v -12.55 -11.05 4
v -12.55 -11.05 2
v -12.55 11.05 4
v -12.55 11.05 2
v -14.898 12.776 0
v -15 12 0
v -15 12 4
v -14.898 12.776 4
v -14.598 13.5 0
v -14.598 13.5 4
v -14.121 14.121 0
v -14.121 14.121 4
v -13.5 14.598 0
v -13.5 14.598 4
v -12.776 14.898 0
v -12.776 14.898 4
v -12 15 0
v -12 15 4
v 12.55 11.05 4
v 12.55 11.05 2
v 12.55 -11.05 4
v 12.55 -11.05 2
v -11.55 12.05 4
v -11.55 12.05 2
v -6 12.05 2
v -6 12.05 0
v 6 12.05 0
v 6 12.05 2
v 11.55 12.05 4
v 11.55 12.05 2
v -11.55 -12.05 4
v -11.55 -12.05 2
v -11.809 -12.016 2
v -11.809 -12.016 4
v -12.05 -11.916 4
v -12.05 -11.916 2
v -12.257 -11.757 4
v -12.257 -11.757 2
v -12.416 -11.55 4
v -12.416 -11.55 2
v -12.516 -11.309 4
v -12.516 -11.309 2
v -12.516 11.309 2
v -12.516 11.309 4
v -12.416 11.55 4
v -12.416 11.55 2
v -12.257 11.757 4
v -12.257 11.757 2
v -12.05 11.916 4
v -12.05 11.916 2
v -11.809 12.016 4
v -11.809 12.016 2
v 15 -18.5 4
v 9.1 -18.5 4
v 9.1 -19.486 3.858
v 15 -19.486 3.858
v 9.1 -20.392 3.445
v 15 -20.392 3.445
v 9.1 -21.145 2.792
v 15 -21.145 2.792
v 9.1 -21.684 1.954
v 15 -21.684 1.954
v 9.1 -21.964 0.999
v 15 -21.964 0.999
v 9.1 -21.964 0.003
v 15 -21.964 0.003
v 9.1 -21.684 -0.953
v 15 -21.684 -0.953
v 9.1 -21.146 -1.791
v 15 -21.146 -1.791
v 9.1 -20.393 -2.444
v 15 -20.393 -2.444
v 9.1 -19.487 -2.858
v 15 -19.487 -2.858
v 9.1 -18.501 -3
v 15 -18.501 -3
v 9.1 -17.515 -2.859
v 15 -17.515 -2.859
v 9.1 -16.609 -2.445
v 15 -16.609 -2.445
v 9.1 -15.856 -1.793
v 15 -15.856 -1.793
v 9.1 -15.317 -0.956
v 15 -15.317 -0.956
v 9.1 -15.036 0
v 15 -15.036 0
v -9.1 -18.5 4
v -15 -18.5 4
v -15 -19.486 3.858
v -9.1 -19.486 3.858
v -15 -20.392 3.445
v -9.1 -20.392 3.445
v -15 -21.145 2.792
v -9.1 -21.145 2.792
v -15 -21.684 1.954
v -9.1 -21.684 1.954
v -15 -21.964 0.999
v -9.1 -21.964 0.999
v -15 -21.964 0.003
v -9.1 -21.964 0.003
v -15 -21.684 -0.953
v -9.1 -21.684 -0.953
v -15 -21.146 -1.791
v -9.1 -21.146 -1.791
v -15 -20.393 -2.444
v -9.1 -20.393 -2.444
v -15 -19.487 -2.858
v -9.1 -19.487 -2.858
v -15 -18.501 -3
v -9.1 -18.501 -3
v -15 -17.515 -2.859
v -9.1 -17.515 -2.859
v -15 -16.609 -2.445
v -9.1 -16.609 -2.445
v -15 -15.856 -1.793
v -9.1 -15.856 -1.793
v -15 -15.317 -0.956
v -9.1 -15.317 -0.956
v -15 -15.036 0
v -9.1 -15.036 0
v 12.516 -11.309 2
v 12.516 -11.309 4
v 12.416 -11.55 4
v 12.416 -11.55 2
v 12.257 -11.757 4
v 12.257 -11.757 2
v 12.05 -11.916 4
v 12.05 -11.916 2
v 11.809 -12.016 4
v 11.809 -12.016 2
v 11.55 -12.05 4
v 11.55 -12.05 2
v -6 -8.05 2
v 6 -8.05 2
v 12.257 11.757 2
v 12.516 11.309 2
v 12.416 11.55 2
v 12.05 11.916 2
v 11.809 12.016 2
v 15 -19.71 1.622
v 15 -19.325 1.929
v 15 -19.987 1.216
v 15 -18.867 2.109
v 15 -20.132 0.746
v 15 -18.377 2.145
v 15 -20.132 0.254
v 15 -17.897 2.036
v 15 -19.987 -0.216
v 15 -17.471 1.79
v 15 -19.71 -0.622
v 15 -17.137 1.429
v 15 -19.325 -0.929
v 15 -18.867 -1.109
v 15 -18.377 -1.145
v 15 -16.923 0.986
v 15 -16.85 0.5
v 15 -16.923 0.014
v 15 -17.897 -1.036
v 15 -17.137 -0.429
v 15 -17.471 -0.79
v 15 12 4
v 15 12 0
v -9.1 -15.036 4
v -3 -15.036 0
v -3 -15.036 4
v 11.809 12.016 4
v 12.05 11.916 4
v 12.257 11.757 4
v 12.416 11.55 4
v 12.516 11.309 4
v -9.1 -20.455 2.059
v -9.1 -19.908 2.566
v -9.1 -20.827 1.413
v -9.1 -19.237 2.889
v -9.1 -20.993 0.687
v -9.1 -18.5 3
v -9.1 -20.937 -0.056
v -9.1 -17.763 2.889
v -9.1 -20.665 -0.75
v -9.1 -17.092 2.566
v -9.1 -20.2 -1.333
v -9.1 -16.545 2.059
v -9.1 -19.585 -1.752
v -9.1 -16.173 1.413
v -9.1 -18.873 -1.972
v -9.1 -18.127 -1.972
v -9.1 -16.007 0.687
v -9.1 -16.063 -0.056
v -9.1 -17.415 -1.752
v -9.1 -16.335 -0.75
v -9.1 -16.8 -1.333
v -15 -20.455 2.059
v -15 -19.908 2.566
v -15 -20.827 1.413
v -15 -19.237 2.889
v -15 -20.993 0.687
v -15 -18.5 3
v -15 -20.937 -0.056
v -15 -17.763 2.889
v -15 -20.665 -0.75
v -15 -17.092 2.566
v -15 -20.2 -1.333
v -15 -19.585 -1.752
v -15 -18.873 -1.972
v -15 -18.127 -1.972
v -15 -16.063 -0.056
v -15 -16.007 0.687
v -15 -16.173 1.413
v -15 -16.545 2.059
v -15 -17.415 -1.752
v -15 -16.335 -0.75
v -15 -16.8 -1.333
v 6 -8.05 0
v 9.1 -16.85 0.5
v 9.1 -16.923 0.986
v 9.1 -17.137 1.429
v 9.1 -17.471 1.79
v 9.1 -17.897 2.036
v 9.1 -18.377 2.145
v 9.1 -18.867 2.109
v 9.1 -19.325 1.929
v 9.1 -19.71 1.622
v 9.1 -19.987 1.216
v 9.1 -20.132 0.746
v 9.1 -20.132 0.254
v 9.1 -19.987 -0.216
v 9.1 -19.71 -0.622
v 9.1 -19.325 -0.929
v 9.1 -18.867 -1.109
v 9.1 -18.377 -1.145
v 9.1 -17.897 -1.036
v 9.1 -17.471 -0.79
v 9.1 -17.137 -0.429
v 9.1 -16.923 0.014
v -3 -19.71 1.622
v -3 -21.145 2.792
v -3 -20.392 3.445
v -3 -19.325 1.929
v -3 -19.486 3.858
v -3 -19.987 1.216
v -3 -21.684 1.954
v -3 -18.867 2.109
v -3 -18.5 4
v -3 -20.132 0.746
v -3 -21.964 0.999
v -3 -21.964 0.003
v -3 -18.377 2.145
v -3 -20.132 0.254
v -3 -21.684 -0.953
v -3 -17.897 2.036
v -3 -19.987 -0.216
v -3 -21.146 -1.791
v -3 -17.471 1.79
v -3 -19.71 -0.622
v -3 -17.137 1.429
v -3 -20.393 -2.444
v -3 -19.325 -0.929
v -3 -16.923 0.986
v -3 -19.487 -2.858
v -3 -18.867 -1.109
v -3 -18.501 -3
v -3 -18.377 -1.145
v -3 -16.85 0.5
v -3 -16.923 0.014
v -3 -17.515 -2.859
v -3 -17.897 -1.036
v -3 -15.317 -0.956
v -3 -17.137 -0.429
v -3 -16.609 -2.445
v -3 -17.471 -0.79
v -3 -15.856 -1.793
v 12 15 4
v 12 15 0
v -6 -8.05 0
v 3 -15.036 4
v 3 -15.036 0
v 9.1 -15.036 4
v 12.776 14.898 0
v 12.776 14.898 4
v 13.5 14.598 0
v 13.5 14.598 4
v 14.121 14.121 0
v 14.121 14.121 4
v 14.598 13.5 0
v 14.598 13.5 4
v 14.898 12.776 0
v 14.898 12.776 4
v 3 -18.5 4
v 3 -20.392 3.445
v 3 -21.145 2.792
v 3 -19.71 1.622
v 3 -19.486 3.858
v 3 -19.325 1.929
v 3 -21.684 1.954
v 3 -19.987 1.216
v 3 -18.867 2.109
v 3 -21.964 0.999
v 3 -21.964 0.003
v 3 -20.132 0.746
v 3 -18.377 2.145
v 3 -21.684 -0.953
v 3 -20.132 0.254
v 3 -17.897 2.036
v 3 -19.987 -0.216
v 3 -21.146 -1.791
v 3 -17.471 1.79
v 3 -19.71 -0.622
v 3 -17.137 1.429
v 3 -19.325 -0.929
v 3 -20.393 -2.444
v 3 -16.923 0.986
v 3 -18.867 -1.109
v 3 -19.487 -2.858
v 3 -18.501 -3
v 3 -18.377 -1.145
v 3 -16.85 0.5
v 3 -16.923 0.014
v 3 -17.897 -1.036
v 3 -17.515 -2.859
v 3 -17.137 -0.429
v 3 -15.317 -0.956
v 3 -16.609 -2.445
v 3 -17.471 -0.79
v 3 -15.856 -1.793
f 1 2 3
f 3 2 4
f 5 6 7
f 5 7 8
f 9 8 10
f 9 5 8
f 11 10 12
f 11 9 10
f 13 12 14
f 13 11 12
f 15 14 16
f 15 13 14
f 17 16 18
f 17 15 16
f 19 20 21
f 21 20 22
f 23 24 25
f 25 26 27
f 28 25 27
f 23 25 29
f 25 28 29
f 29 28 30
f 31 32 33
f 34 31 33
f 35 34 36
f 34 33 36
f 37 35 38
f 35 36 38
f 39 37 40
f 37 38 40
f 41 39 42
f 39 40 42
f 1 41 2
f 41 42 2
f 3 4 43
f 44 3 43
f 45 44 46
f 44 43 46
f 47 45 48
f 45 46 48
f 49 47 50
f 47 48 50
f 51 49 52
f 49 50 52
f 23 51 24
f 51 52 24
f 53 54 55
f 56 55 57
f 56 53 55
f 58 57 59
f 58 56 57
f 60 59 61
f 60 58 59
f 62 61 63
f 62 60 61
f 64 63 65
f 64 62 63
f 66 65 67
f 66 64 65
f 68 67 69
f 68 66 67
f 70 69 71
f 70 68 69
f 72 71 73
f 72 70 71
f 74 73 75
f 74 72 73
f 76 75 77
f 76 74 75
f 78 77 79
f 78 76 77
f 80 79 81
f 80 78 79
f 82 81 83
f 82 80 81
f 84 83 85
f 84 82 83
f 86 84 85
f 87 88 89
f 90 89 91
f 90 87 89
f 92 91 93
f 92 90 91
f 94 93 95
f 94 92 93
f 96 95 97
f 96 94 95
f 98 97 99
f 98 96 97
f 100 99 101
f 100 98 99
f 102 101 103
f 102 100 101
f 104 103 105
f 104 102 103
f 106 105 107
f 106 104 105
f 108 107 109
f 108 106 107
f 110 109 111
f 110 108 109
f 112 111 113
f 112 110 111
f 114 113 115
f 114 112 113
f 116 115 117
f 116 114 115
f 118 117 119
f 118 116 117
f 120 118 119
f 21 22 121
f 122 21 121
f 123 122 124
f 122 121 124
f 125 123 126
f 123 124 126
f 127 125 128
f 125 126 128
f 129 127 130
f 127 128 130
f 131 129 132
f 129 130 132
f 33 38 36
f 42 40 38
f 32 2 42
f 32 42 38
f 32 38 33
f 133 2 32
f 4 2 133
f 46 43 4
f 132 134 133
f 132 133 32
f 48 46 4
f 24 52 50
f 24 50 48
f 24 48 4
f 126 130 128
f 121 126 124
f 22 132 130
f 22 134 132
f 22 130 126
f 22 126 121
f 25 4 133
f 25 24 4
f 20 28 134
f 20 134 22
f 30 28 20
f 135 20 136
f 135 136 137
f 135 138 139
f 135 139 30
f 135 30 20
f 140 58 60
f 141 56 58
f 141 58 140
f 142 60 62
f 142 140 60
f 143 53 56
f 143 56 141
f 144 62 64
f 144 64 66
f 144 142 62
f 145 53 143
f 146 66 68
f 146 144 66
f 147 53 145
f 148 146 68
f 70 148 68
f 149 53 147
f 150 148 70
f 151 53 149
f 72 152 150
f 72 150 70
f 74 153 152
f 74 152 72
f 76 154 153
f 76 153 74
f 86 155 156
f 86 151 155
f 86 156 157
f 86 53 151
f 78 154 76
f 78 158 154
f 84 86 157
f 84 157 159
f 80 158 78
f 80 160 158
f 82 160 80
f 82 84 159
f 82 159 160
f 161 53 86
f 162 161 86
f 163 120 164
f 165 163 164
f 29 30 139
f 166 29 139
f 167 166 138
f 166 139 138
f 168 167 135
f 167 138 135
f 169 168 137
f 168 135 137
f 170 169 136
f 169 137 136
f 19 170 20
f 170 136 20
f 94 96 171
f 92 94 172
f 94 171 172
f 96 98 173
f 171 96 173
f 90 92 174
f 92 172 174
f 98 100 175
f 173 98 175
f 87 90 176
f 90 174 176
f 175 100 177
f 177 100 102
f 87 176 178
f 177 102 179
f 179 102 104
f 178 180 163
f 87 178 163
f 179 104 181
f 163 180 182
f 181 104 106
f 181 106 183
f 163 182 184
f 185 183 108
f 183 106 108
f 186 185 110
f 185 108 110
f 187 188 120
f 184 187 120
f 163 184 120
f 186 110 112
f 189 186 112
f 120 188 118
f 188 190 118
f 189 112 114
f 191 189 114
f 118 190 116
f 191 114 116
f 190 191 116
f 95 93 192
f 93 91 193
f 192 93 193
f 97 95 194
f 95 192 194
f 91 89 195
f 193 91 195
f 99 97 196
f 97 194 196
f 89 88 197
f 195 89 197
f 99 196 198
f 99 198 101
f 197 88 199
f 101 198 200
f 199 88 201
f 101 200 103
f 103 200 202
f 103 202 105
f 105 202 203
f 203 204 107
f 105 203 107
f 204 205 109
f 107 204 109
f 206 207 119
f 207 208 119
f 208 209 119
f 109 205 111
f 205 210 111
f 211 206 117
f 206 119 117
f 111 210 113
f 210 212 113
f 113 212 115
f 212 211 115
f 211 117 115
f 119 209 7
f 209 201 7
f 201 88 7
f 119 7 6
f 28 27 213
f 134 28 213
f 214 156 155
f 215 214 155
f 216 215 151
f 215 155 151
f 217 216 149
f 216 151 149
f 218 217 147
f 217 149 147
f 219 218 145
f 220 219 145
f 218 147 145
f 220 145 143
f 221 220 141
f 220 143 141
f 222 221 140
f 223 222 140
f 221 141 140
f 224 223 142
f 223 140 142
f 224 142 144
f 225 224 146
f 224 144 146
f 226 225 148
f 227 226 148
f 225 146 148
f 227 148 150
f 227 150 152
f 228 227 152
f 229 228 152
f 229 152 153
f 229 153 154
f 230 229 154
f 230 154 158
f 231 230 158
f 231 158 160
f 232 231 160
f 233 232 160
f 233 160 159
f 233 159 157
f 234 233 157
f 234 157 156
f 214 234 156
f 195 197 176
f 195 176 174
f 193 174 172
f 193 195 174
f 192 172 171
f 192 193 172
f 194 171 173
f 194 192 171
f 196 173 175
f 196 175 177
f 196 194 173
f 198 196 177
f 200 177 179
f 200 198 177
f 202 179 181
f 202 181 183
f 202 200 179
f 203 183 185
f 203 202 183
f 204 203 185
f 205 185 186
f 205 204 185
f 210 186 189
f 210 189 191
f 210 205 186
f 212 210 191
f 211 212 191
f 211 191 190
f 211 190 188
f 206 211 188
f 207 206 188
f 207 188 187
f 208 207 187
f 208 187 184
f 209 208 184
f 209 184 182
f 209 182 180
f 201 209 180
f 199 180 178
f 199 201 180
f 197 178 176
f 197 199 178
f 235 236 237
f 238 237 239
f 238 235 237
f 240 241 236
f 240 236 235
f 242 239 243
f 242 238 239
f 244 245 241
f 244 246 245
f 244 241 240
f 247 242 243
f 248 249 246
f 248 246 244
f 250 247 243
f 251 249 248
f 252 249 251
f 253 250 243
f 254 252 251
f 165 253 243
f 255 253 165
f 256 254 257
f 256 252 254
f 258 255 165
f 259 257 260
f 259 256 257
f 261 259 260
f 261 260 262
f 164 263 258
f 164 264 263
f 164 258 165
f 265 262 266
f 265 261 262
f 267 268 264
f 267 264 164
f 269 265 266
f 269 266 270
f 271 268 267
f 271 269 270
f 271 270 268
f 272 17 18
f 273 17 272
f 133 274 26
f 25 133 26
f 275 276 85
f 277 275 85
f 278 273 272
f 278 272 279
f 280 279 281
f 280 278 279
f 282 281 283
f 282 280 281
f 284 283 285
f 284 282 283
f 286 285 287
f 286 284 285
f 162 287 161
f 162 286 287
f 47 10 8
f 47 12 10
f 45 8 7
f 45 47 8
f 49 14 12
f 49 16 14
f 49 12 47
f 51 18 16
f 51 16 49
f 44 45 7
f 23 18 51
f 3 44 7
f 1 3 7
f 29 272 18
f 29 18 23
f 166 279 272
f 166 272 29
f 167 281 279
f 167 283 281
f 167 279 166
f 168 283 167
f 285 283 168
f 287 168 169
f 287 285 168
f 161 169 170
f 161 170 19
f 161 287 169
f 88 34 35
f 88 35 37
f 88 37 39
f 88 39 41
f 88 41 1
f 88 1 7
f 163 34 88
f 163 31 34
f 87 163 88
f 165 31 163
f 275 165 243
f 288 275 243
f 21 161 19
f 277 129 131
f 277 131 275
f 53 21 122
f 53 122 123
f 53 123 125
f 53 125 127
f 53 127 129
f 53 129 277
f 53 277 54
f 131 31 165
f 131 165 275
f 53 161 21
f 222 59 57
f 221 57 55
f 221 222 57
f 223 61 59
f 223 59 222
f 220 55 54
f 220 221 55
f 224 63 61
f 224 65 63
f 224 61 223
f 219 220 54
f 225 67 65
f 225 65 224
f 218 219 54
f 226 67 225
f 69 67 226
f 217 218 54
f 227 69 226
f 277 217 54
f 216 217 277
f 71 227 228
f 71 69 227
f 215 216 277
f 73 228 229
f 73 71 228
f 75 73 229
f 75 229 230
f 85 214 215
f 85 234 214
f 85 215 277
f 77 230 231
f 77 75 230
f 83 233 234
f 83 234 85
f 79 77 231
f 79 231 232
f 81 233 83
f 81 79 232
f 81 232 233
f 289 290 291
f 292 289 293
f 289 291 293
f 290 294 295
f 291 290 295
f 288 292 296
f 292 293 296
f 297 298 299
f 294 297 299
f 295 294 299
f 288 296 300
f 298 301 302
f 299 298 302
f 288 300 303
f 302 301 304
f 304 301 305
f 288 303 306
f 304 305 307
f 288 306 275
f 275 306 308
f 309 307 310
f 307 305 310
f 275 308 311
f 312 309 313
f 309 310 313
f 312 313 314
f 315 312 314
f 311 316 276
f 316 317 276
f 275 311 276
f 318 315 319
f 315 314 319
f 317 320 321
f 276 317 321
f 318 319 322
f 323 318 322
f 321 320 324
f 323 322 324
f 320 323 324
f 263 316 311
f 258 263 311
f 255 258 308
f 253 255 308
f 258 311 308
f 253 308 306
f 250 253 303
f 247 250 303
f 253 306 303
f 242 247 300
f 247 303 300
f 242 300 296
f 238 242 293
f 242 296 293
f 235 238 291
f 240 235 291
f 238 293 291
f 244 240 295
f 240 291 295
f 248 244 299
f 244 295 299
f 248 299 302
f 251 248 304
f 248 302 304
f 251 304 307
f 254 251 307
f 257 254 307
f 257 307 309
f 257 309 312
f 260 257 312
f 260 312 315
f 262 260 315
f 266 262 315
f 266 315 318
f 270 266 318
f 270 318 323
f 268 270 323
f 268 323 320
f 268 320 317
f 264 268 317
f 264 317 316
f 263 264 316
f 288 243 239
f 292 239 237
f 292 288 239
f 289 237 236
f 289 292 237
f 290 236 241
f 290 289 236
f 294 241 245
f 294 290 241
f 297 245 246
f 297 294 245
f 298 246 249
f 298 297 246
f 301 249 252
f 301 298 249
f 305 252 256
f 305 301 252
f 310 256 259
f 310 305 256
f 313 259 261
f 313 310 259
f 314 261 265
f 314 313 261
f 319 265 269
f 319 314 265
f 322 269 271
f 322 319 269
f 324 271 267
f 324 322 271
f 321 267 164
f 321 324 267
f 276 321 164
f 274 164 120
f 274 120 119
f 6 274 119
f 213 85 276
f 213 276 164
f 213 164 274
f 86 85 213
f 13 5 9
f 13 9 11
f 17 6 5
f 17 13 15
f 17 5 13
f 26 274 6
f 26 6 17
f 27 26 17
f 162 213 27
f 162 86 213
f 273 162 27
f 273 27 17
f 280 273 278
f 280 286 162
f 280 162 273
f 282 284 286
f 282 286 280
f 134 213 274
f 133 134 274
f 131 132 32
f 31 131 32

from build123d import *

# Parameters (mm, degrees)
SALIENTE_EXTRUIR1_DEPTH    = 2
SALIENTE_EXTRUIR2_DEPTH    = 4
CROQUIS2_R                 = 1.65
SALIENTE_EXTRUIR3_DEPTH    = 30
CORTAR_EXTRUIR1_DEPTH      = 27.925824036
CORTAR_EXTRUIR1_DEPTH_BACK = 27.925824036
CROQUIS3_W                 = 6.1
CROQUIS3_H                 = 6.964101615
CORTAR_EXTRUIR3_START      = -30
CROQUIS2_3_R               = 2.5
CROQUIS2_3_R_2             = 1.65
CORTAR_EXTRUIR3_DEPTH      = 5.9


with BuildPart() as part:
    # Croquis1 → Saliente-Extruir1 (new body)
    with BuildSketch(Plane.XY):
        with BuildLine():
            Line((-6, 12.05), (-11.55, 12.05))
            ThreePointArc((-11.55, 12.05), (-12.257106781, 11.757106781), (-12.55, 11.05))
            Line((-12.55, 11.05), (-12.55, -11.05))
            ThreePointArc((-12.55, -11.05), (-12.257106781, -11.757106781), (-11.55, -12.05))
            Line((-11.55, -12.05), (11.55, -12.05))
            ThreePointArc((11.55, -12.05), (12.257106781, -11.757106781), (12.55, -11.05))
            Line((12.55, -11.05), (12.55, 11.05))
            ThreePointArc((12.55, 11.05), (12.257106781, 11.757106781), (11.55, 12.05))
            Line((11.55, 12.05), (6, 12.05))
            Line((6, 12.05), (6, -8.05))
            Line((6, -8.05), (-6, -8.05))
            Line((-6, -8.05), (-6, 12.05))
        make_face()
    extrude(amount=SALIENTE_EXTRUIR1_DEPTH)

    # Croquis1<3> → Saliente-Extruir2 (add)
    with BuildSketch(Plane.XY):
        with BuildLine():
            Line((-12, 15), (12, 15))
            ThreePointArc((12, 15), (14.121320344, 14.121320344), (15, 12))
            Line((15, 12), (15, -15))
            Line((15, -15), (-15, -15))
            Line((-15, -15), (-15, 12))
            ThreePointArc((-15, 12), (-14.121320344, 14.121320344), (-12, 15))
        make_face()
        with BuildLine():
            Line((-11.55, 12.05), (11.55, 12.05))
            ThreePointArc((11.55, 12.05), (12.257106781, 11.757106781), (12.55, 11.05))
            Line((12.55, 11.05), (12.55, -11.05))
            ThreePointArc((12.55, -11.05), (12.257106781, -11.757106781), (11.55, -12.05))
            Line((11.55, -12.05), (-11.55, -12.05))
            ThreePointArc((-11.55, -12.05), (-12.257106781, -11.757106781), (-12.55, -11.05))
            Line((-12.55, -11.05), (-12.55, 11.05))
            ThreePointArc((-12.55, 11.05), (-12.257106781, 11.757106781), (-11.55, 12.05))
        make_face(mode=Mode.SUBTRACT)
    extrude(amount=SALIENTE_EXTRUIR2_DEPTH)

    # Croquis2 → Saliente-Extruir3 (add)
    with BuildSketch(Plane(origin=(15, 0, 0), x_dir=(0, 0, -1), z_dir=(1, 0, 0))):
        with BuildLine():
            Line((0, -15.035898385), (0, -15))
            Line((0, -15), (-4, -15))
            Line((-4, -15), (-4, -18.5))
            ThreePointArc((-4, -18.5), (1.791287847, -21.145751311), (0, -15.035898385))
        make_face()
        with Locations(Location((-0.5, -18.5, 0), (0, 0, 90))):
            Circle(CROQUIS2_R, mode=Mode.SUBTRACT)
    extrude(amount=-SALIENTE_EXTRUIR3_DEPTH)

    # Croquis3 → Cortar-Extruir1 (cut, two sides: drawn at the far end of the back side and taken through both)
    with BuildSketch(Plane.XY.offset(-CORTAR_EXTRUIR1_DEPTH_BACK)):
        with Locations((-6.05, -18.517949193)):
            Rectangle(CROQUIS3_W, CROQUIS3_H)
        with Locations((6.05, -18.517949193)):
            Rectangle(CROQUIS3_W, CROQUIS3_H)
    extrude(amount=CORTAR_EXTRUIR1_DEPTH + CORTAR_EXTRUIR1_DEPTH_BACK, mode=Mode.SUBTRACT)

    # Croquis2<3> → Cortar-Extruir3 (cut)
    with BuildSketch(Plane(origin=(15, 0, 0), x_dir=(0, 0, -1), z_dir=(1, 0, 0)).offset(CORTAR_EXTRUIR3_START)):
        with Locations(Location((-0.5, -18.5, 0), (0, 0, 180))):
            Circle(CROQUIS2_3_R)
        with Locations(Location((-0.5, -18.5, 0), (0, 0, 90))):
            Circle(CROQUIS2_3_R_2, mode=Mode.SUBTRACT)
    extrude(amount=CORTAR_EXTRUIR3_DEPTH, mode=Mode.SUBTRACT)


solid = part.part
